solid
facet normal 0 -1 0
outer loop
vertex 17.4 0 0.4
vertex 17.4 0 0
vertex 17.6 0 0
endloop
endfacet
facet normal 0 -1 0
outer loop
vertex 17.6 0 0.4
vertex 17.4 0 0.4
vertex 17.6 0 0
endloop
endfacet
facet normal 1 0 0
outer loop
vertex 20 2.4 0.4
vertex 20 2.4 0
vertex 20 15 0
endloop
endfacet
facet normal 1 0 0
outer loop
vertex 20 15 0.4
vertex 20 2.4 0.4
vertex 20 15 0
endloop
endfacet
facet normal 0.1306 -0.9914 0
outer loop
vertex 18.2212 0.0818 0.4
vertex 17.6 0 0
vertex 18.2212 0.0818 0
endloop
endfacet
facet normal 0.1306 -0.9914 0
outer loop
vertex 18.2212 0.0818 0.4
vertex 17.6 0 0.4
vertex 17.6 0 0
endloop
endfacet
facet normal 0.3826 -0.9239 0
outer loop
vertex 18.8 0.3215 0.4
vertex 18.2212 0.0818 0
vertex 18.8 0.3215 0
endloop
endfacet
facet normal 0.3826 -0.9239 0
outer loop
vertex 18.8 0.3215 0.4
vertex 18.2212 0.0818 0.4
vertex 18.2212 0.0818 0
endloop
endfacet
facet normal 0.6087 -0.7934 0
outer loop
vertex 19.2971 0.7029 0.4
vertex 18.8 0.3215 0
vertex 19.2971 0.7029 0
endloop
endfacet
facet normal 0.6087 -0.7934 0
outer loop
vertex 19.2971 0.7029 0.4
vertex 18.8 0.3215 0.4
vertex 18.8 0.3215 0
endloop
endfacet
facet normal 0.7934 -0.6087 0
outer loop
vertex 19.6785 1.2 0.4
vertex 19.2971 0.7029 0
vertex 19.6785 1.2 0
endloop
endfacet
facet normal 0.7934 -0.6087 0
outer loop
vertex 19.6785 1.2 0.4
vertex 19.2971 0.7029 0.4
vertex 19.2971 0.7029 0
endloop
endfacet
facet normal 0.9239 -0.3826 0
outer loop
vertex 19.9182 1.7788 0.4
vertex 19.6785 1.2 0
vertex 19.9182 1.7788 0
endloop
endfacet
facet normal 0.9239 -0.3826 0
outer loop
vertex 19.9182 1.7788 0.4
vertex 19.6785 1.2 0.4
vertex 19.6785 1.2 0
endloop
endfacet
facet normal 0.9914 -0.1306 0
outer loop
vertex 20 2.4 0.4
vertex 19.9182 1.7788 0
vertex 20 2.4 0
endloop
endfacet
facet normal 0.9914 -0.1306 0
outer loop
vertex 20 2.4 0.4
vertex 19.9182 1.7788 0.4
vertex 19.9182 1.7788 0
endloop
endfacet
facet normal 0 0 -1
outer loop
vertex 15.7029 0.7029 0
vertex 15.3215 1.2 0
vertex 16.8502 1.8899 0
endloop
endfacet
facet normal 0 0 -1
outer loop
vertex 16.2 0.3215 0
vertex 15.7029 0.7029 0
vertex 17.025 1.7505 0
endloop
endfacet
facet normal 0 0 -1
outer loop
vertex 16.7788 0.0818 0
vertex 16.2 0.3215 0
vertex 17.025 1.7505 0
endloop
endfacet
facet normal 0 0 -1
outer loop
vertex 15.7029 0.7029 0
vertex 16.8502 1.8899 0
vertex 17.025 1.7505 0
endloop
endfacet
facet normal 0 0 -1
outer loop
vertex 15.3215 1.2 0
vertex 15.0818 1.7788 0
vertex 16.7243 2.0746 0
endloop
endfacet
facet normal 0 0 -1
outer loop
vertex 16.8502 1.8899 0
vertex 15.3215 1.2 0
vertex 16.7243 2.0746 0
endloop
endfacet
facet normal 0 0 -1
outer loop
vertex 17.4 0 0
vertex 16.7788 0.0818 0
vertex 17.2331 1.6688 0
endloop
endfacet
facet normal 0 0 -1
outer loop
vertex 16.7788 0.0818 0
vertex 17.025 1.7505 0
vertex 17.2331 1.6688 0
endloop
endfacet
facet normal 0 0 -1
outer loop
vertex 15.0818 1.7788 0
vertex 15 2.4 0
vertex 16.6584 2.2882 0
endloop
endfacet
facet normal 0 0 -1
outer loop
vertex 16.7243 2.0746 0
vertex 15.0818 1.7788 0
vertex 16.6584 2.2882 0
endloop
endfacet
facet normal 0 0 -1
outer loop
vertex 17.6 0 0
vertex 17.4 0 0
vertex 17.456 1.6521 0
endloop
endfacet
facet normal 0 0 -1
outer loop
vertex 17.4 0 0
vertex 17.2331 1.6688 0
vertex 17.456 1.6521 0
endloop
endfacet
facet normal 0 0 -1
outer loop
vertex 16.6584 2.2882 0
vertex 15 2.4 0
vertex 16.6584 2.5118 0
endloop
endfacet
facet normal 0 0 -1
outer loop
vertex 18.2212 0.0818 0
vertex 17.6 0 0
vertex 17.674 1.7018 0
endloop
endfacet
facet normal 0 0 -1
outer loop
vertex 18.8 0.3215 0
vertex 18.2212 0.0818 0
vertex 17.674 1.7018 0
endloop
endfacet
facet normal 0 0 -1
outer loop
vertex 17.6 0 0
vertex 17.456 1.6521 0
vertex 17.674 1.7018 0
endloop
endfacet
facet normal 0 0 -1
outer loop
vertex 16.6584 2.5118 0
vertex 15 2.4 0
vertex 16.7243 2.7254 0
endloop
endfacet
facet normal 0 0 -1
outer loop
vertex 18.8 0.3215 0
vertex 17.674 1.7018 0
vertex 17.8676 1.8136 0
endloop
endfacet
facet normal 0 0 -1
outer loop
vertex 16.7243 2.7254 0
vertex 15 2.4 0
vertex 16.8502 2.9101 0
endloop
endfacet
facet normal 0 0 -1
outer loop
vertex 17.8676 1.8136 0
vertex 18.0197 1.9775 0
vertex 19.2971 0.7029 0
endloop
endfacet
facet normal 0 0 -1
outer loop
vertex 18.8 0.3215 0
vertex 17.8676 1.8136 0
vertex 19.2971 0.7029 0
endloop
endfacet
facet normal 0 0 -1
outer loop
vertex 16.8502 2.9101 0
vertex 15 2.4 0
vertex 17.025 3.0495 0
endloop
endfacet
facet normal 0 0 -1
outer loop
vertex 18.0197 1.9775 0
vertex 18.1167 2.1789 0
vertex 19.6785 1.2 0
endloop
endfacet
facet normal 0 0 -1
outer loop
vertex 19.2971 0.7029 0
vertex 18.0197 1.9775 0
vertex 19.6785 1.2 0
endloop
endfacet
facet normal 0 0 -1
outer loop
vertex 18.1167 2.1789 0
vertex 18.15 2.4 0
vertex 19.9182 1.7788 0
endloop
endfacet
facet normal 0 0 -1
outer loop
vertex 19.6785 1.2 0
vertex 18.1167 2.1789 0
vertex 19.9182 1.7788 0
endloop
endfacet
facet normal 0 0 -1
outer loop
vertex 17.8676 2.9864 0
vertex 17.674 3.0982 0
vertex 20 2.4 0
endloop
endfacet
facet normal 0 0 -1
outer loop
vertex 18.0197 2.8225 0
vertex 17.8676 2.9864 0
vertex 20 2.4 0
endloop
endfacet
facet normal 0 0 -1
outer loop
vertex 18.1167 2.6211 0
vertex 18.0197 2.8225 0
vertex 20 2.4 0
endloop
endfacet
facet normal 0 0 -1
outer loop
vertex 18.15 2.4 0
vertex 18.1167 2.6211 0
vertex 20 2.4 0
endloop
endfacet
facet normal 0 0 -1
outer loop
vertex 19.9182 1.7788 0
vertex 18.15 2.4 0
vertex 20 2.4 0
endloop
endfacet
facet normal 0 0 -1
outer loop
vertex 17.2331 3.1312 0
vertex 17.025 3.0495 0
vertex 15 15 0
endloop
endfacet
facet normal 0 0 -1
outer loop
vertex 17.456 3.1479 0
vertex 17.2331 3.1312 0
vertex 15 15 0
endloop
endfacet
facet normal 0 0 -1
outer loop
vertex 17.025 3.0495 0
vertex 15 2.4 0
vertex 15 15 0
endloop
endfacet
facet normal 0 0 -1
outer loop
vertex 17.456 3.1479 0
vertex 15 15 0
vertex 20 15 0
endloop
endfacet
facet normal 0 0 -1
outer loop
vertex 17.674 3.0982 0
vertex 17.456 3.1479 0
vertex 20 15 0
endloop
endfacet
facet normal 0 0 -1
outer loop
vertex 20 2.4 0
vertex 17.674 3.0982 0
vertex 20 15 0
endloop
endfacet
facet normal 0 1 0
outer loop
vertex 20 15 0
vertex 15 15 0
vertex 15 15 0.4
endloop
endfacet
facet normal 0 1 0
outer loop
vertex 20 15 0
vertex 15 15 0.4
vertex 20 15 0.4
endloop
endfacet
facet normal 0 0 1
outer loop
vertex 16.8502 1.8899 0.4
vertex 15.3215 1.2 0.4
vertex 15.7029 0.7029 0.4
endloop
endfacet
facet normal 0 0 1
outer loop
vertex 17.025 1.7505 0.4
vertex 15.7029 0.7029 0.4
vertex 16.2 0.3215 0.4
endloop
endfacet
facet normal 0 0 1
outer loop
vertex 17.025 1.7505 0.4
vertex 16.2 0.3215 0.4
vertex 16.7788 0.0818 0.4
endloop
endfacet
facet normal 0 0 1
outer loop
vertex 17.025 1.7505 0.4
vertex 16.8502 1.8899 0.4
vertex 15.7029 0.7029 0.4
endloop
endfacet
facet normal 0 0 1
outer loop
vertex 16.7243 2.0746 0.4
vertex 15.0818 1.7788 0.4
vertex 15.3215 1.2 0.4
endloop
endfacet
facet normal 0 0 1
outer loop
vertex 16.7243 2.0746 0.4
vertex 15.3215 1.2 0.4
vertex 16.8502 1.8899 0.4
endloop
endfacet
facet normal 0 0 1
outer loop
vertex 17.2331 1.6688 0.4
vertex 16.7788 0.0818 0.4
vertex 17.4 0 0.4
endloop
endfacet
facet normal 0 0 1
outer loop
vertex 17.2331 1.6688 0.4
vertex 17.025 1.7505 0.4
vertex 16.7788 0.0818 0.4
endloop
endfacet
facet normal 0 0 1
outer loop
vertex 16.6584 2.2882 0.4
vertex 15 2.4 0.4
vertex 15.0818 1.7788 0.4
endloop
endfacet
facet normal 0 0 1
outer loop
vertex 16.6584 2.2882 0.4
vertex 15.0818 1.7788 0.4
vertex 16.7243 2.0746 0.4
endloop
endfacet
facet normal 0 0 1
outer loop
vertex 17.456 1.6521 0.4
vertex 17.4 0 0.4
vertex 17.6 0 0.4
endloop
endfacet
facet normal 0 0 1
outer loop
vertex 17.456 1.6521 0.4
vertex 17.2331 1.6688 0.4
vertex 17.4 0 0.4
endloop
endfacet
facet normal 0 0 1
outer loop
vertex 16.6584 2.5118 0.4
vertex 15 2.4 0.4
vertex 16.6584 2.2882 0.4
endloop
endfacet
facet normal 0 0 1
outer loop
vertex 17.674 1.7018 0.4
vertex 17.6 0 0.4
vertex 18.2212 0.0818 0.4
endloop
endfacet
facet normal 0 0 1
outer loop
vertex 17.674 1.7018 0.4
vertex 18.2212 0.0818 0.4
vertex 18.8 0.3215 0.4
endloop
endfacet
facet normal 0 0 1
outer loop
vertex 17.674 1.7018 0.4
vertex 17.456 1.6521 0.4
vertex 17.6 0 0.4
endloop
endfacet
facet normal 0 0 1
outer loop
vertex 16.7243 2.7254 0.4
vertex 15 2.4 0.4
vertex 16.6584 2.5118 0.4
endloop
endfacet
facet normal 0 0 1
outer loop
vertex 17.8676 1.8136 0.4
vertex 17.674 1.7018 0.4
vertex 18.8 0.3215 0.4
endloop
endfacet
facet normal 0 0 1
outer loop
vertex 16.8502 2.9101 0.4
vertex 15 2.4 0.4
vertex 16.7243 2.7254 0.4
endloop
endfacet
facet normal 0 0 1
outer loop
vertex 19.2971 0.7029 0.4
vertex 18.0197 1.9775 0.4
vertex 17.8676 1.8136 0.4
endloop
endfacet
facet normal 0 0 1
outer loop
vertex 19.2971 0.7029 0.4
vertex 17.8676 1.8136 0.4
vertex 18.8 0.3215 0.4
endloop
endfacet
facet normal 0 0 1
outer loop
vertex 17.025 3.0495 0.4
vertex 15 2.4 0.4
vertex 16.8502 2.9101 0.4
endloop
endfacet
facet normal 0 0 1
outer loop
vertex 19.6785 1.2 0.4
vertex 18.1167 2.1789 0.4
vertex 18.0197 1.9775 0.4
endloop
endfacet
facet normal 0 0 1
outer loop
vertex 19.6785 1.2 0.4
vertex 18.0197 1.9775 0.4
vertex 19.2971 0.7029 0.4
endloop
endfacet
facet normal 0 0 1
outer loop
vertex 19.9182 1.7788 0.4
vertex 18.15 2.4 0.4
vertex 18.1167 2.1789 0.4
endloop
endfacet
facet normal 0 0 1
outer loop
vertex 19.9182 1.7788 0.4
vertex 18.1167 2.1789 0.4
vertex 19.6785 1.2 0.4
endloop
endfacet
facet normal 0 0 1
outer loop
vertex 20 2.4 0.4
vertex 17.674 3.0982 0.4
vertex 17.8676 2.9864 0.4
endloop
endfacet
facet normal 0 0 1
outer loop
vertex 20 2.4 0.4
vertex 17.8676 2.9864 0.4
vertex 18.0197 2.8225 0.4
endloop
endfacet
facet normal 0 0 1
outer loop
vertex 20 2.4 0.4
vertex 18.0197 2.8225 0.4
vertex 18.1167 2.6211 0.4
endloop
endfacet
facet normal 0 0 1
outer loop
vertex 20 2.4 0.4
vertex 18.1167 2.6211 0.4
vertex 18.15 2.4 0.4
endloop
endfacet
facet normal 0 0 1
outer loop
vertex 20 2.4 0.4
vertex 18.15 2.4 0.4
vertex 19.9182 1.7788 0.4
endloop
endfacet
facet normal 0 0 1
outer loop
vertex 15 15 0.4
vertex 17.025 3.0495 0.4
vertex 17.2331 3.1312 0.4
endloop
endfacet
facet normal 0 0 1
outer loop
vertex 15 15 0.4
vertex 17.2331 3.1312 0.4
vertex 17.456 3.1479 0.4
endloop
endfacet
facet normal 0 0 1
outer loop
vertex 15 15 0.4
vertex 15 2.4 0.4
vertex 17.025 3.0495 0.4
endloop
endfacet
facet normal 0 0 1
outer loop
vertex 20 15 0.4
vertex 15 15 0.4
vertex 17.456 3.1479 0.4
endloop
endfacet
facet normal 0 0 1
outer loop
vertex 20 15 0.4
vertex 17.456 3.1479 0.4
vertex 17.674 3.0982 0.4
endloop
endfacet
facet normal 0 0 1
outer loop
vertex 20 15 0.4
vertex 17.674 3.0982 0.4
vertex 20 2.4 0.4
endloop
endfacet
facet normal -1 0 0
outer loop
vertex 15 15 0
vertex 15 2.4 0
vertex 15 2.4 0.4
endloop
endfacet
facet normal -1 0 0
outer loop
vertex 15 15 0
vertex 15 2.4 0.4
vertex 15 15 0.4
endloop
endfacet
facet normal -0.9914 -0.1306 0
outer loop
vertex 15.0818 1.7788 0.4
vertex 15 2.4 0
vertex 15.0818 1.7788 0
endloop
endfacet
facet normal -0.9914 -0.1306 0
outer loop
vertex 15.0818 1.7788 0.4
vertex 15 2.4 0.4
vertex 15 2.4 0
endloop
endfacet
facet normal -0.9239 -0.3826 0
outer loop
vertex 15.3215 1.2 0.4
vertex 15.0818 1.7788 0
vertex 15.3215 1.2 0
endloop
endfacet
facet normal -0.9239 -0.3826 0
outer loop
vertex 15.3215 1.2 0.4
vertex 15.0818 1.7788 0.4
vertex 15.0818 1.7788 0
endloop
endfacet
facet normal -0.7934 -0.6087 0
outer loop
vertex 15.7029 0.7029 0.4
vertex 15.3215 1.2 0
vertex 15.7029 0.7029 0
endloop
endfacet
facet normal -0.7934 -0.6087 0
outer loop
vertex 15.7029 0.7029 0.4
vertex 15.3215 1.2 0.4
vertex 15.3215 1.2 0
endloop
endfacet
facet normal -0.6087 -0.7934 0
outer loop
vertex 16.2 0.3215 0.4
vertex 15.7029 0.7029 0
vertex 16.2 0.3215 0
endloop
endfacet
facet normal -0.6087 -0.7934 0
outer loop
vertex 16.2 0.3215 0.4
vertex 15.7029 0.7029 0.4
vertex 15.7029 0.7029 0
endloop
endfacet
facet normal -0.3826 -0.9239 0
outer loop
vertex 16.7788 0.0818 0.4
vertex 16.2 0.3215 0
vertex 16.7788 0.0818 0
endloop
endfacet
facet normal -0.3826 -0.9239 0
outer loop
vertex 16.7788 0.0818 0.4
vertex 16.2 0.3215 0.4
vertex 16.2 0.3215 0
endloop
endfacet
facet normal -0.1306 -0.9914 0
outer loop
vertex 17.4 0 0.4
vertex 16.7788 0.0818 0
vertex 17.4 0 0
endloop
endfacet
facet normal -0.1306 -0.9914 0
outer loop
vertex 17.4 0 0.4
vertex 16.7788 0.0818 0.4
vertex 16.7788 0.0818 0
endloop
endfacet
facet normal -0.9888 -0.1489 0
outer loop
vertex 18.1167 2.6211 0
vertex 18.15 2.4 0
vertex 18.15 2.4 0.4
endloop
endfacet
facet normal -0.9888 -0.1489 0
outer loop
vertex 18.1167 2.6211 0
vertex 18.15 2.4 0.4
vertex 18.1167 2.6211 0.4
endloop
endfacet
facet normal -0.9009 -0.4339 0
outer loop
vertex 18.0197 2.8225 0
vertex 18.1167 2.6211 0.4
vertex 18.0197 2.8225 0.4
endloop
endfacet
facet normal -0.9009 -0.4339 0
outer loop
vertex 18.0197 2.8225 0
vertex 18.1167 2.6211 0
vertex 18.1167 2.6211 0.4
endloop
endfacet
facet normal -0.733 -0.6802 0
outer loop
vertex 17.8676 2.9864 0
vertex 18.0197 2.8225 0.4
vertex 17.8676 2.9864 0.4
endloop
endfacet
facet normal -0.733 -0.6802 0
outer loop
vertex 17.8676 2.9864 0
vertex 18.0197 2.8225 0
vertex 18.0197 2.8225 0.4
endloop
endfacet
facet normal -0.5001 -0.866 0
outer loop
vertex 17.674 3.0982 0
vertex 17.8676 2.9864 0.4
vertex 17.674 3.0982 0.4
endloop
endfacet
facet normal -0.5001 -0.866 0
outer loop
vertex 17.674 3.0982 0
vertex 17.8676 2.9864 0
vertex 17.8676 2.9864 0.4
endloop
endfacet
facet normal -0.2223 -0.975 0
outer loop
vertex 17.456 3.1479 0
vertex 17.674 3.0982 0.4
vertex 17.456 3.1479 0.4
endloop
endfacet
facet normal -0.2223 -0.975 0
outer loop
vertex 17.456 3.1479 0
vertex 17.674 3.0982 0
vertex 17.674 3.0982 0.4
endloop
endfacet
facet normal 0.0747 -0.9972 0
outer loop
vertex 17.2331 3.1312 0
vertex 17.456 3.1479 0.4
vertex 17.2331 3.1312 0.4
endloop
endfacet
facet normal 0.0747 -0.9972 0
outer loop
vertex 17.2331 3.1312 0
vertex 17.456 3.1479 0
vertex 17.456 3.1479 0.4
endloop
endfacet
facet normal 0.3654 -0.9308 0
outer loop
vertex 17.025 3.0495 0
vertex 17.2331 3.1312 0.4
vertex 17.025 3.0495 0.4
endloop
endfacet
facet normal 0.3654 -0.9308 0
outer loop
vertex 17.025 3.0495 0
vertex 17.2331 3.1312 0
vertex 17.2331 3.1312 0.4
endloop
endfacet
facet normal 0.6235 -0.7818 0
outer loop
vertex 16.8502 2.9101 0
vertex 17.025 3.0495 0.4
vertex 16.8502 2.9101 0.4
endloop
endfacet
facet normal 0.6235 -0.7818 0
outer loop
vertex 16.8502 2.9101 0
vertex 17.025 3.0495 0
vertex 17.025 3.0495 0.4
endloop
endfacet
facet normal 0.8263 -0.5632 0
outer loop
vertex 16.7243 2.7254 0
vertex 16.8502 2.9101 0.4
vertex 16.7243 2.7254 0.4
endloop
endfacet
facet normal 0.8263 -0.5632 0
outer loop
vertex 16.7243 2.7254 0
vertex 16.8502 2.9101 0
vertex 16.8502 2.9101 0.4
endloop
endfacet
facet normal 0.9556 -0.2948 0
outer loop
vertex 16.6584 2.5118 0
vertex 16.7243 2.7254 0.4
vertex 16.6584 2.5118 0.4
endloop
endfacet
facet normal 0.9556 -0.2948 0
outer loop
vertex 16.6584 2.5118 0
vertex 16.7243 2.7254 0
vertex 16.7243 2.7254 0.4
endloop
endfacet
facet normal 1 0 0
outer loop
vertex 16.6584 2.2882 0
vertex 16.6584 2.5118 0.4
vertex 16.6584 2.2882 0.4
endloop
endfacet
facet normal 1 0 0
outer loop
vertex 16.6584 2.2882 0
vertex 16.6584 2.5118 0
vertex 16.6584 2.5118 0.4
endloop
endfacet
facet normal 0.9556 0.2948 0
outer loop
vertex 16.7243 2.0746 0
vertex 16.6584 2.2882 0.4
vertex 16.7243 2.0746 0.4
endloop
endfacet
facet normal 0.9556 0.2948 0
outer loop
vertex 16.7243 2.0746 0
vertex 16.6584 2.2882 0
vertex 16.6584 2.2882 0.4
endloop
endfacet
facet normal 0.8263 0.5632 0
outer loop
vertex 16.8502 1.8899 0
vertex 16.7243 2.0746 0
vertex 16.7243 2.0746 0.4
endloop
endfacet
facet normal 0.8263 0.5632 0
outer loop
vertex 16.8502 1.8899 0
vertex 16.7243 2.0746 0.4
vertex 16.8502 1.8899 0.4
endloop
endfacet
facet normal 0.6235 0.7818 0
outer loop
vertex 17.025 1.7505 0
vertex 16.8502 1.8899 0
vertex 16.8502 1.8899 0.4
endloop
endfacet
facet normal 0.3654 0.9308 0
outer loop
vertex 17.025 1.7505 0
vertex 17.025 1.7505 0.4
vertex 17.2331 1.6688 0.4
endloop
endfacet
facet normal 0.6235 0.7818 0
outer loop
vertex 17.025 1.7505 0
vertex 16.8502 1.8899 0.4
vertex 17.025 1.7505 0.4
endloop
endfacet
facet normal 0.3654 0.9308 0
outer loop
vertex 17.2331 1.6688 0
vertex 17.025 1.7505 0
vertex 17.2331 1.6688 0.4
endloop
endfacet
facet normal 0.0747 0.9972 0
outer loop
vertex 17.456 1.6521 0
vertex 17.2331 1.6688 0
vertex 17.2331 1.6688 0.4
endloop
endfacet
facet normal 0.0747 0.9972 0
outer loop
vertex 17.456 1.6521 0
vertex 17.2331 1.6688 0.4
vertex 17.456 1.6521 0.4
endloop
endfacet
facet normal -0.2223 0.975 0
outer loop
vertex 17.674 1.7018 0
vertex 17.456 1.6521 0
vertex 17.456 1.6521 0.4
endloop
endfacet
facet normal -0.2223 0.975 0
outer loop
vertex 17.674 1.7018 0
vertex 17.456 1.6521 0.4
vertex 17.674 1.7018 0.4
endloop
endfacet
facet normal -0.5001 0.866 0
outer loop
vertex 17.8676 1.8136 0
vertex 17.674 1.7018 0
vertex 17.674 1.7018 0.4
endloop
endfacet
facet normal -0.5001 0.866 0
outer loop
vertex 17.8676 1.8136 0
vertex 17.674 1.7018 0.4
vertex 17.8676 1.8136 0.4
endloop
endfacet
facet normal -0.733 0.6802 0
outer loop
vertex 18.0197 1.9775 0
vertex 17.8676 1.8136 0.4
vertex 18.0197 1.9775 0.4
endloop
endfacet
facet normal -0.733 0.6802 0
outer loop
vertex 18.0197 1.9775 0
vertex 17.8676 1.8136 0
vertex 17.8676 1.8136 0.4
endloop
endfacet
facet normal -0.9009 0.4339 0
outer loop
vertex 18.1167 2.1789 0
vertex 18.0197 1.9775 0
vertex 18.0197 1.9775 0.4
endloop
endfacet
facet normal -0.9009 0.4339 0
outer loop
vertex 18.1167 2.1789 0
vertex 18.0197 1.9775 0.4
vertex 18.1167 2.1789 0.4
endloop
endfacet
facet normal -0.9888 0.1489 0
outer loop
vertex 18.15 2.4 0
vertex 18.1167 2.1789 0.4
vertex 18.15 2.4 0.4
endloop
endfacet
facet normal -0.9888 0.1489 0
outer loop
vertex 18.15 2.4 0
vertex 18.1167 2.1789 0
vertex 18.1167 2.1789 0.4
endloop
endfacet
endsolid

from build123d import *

# Parameters (mm, degrees)
CYLINDER_R     = 0.75
CYLINDER_DEPTH = 10
BOX_W          = 5
BOX_H          = 15
BOX_DEPTH      = 0.4
FILLET_R       = 2.4


with BuildPart() as cylinder:
    # Cylinder → Cylinder (new body)
    with BuildSketch(Plane(origin=(17.4, 2.4, -4.2), x_dir=(1, 0, 0), z_dir=(0, 0, 1))):
        Circle(CYLINDER_R)
    extrude(amount=CYLINDER_DEPTH)


with BuildPart() as cut:
    # Box → Box (new body)
    with BuildSketch(Plane(origin=(15, 0, 0), x_dir=(1, 0, 0), z_dir=(0, 0, 1))):
        with Locations((2.5, 7.5)):
            Rectangle(BOX_W, BOX_H)
    extrude(amount=BOX_DEPTH)

    # Fillet
    fillet_edges = [cut.edges().sort_by_distance(p)[0] for p in [
        (15, 0, 0.2),
        (20, 0, 0.2),
    ]]
    fillet(fillet_edges, radius=FILLET_R)

    # Cut: cut Cylinder
    add(cylinder.part, mode=Mode.SUBTRACT)


solid = cut.part
